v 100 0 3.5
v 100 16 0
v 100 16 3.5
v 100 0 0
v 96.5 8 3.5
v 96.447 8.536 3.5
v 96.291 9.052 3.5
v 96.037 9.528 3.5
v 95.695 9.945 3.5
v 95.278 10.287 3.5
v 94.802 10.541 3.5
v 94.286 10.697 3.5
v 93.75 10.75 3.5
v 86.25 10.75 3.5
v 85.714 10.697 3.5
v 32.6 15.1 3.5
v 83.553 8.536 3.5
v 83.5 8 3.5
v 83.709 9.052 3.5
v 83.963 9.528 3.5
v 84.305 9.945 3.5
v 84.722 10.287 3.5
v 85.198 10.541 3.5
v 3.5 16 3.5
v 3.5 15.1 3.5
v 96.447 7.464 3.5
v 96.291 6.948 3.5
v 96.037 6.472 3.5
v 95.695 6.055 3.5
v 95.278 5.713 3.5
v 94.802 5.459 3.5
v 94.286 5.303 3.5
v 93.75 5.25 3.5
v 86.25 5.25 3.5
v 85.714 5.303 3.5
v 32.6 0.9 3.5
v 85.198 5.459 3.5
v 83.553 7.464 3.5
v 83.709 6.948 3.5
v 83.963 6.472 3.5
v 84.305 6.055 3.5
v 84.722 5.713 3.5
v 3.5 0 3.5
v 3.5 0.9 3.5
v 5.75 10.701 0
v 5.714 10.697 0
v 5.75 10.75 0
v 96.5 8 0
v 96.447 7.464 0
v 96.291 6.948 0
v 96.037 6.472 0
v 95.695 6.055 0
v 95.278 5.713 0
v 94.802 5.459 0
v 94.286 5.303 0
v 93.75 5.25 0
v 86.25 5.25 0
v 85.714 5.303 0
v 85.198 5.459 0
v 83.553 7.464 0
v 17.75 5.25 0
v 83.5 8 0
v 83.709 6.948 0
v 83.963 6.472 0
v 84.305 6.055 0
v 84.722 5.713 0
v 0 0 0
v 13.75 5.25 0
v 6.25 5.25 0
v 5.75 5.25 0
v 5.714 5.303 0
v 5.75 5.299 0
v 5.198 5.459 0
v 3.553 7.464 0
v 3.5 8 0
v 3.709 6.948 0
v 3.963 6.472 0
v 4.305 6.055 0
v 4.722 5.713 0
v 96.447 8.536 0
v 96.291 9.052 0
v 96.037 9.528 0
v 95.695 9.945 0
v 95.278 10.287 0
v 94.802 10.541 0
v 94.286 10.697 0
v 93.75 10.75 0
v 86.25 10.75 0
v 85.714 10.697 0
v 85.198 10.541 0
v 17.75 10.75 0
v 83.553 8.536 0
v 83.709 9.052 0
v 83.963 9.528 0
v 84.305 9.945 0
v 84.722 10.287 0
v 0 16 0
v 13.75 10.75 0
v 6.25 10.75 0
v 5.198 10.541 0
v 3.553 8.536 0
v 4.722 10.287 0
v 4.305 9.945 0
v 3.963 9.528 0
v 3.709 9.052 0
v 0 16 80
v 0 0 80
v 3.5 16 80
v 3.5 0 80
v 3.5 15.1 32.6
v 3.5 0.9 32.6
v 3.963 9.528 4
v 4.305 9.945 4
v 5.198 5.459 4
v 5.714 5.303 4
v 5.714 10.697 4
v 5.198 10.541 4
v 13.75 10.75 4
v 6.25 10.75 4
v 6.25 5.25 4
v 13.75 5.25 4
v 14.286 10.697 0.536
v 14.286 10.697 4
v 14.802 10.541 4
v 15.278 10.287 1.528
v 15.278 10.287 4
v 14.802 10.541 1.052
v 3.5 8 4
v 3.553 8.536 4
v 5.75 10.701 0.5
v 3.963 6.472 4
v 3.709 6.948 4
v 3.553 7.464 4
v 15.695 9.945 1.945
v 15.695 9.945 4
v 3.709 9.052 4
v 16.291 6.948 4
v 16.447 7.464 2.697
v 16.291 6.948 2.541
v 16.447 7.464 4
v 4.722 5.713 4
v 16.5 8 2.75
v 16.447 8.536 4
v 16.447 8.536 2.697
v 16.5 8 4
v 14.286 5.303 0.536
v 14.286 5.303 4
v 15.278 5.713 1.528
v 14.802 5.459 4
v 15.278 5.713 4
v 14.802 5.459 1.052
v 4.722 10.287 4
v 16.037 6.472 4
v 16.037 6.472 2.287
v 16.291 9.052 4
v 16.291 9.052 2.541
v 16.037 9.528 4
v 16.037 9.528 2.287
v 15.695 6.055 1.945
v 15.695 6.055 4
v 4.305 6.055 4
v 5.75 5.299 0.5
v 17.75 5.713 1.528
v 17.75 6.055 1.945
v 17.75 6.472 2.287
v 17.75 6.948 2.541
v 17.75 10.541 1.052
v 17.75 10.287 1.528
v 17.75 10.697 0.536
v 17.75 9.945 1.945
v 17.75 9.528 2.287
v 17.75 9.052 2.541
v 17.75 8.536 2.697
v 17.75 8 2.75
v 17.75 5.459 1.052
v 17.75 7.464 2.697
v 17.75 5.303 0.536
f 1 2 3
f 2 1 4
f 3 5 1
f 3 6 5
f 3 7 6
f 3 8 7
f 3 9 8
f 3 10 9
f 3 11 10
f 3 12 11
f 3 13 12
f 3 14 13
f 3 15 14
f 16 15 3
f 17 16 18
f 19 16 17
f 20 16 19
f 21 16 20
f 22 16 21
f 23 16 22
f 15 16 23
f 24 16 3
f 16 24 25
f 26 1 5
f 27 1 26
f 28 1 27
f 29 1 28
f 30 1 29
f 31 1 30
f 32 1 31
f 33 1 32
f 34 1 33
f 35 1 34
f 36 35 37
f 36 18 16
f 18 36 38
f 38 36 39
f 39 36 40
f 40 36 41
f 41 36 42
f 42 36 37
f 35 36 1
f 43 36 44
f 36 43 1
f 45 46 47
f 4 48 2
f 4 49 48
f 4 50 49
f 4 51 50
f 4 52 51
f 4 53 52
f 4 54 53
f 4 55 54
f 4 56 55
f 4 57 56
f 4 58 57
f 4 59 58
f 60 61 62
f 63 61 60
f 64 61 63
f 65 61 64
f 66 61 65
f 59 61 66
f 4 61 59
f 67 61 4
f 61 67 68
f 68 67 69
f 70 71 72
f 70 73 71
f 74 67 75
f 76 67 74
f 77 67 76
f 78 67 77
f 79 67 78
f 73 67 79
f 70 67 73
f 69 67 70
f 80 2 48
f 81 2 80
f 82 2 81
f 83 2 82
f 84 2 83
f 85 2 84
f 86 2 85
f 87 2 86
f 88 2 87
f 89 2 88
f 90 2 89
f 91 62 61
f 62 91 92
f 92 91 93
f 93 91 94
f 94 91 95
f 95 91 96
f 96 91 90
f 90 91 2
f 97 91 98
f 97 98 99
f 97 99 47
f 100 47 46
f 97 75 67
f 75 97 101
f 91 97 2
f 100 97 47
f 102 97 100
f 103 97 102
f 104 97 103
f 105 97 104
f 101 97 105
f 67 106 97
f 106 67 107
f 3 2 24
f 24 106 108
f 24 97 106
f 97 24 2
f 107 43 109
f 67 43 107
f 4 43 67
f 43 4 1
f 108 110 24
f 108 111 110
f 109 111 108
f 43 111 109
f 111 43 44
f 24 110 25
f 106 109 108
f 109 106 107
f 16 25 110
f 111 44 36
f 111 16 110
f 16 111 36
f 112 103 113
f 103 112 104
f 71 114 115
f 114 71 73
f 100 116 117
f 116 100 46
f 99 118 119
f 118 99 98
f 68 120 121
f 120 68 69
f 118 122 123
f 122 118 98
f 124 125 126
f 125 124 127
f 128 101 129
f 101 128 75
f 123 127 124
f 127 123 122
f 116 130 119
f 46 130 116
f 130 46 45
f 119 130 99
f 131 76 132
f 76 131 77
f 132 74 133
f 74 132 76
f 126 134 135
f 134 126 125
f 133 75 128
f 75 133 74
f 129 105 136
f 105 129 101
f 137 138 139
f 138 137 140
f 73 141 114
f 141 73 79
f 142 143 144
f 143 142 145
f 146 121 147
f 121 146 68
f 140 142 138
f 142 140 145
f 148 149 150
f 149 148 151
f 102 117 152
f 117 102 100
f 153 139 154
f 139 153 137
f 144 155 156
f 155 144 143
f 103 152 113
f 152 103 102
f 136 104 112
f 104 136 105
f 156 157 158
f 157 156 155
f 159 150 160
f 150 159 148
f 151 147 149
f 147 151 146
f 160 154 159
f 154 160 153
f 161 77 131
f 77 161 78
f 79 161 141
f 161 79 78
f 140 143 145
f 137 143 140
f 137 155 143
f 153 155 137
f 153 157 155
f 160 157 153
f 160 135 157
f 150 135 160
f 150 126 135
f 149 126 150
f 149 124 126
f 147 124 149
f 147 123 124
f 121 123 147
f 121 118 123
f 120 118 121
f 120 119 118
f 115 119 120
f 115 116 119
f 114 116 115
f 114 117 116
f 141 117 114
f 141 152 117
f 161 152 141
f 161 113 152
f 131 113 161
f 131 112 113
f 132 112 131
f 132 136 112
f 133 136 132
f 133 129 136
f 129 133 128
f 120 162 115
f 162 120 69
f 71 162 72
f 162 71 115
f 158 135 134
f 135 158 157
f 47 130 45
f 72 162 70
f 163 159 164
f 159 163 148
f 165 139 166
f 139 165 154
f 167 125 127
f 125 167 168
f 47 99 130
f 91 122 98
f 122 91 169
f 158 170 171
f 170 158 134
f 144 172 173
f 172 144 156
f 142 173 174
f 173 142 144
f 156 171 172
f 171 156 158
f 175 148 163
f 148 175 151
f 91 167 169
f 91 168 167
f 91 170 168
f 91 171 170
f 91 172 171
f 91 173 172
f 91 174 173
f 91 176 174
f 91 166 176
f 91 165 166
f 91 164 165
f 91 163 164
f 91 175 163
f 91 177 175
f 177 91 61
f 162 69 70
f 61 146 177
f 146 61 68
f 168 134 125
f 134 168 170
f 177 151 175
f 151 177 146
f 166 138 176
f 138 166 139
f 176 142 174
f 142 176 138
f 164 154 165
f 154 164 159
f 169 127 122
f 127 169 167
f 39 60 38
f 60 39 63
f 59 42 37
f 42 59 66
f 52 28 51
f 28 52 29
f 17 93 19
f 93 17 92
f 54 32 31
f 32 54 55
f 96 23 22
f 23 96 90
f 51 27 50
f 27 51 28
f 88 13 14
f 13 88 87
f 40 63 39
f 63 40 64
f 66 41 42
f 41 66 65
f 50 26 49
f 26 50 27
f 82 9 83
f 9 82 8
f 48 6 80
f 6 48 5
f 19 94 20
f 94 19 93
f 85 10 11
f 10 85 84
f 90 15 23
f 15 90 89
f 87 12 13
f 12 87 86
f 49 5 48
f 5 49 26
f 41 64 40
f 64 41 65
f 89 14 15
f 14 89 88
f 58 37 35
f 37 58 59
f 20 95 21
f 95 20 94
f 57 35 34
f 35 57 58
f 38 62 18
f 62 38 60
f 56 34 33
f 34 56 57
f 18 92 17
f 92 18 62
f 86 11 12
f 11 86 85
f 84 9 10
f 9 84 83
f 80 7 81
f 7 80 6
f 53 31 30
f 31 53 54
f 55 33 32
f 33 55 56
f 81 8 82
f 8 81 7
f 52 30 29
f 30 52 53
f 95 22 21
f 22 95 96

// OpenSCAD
$fn = 32;

// ----------------------------------------------------------------------
// L-bracket: 100 x 16 x 80 mm
// ----------------------------------------------------------------------

// --- parameters (mm) ---
arm_x = 100;              // horizontal leg, X
arm_z = 80;               // vertical leg, Z
width = 16;               // bracket depth, Y
wall = 3.5;               // plate thickness
hole_d = 4.5;             // clearance for M4
slot_w = 5.5;             // euro screw slot width
slot_l = 13;              // euro screw slot length
rib_leg = 35.2;           // gusset leg
rib_sink = 0.9;           // gusset overlap into the plates

module hole_z(px, py) {
  translate([px, py, -0.5]) cylinder(h = wall + 1, d = hole_d);
}
module hole_x(pz, py) {
  translate([-0.5, py, pz]) rotate([0, 90, 0]) cylinder(h = wall + 1, d = hole_d);
}
module euro_slot_z(px, py) {
  hull() {
    translate([px - (slot_l - slot_w) / 2, py, -0.5]) cylinder(h = wall + 1, d = slot_w);
    translate([px + (slot_l - slot_w) / 2, py, -0.5]) cylinder(h = wall + 1, d = slot_w);
  }
}
module euro_slot_x(pz, py) {
  translate([-0.5, 0, 0]) rotate([0, 90, 0]) hull() {
    translate([0, py, pz - (slot_l - slot_w) / 2]) cylinder(h = wall + 1, d = slot_w);
    translate([0, py, pz + (slot_l - slot_w) / 2]) cylinder(h = wall + 1, d = slot_w);
  }
}
module gusset() {
  translate([0, width - rib_sink, 0])
    rotate([90, 0, 0])
      linear_extrude(height = width - 2 * rib_sink)
        polygon(points = [[rib_sink, rib_sink], [rib_leg, rib_sink], [rib_sink, rib_leg]]);
}

difference() {
  union() {
    /* horizontal leg */
    cube([arm_x, width, wall]);
    /* vertical leg, overlapping the corner block */
    cube([wall, width, arm_z]);
    gusset();
  }
  euro_slot_z(10, 8);
  euro_slot_x(10, 8);
  euro_slot_z(90, 8);
}
